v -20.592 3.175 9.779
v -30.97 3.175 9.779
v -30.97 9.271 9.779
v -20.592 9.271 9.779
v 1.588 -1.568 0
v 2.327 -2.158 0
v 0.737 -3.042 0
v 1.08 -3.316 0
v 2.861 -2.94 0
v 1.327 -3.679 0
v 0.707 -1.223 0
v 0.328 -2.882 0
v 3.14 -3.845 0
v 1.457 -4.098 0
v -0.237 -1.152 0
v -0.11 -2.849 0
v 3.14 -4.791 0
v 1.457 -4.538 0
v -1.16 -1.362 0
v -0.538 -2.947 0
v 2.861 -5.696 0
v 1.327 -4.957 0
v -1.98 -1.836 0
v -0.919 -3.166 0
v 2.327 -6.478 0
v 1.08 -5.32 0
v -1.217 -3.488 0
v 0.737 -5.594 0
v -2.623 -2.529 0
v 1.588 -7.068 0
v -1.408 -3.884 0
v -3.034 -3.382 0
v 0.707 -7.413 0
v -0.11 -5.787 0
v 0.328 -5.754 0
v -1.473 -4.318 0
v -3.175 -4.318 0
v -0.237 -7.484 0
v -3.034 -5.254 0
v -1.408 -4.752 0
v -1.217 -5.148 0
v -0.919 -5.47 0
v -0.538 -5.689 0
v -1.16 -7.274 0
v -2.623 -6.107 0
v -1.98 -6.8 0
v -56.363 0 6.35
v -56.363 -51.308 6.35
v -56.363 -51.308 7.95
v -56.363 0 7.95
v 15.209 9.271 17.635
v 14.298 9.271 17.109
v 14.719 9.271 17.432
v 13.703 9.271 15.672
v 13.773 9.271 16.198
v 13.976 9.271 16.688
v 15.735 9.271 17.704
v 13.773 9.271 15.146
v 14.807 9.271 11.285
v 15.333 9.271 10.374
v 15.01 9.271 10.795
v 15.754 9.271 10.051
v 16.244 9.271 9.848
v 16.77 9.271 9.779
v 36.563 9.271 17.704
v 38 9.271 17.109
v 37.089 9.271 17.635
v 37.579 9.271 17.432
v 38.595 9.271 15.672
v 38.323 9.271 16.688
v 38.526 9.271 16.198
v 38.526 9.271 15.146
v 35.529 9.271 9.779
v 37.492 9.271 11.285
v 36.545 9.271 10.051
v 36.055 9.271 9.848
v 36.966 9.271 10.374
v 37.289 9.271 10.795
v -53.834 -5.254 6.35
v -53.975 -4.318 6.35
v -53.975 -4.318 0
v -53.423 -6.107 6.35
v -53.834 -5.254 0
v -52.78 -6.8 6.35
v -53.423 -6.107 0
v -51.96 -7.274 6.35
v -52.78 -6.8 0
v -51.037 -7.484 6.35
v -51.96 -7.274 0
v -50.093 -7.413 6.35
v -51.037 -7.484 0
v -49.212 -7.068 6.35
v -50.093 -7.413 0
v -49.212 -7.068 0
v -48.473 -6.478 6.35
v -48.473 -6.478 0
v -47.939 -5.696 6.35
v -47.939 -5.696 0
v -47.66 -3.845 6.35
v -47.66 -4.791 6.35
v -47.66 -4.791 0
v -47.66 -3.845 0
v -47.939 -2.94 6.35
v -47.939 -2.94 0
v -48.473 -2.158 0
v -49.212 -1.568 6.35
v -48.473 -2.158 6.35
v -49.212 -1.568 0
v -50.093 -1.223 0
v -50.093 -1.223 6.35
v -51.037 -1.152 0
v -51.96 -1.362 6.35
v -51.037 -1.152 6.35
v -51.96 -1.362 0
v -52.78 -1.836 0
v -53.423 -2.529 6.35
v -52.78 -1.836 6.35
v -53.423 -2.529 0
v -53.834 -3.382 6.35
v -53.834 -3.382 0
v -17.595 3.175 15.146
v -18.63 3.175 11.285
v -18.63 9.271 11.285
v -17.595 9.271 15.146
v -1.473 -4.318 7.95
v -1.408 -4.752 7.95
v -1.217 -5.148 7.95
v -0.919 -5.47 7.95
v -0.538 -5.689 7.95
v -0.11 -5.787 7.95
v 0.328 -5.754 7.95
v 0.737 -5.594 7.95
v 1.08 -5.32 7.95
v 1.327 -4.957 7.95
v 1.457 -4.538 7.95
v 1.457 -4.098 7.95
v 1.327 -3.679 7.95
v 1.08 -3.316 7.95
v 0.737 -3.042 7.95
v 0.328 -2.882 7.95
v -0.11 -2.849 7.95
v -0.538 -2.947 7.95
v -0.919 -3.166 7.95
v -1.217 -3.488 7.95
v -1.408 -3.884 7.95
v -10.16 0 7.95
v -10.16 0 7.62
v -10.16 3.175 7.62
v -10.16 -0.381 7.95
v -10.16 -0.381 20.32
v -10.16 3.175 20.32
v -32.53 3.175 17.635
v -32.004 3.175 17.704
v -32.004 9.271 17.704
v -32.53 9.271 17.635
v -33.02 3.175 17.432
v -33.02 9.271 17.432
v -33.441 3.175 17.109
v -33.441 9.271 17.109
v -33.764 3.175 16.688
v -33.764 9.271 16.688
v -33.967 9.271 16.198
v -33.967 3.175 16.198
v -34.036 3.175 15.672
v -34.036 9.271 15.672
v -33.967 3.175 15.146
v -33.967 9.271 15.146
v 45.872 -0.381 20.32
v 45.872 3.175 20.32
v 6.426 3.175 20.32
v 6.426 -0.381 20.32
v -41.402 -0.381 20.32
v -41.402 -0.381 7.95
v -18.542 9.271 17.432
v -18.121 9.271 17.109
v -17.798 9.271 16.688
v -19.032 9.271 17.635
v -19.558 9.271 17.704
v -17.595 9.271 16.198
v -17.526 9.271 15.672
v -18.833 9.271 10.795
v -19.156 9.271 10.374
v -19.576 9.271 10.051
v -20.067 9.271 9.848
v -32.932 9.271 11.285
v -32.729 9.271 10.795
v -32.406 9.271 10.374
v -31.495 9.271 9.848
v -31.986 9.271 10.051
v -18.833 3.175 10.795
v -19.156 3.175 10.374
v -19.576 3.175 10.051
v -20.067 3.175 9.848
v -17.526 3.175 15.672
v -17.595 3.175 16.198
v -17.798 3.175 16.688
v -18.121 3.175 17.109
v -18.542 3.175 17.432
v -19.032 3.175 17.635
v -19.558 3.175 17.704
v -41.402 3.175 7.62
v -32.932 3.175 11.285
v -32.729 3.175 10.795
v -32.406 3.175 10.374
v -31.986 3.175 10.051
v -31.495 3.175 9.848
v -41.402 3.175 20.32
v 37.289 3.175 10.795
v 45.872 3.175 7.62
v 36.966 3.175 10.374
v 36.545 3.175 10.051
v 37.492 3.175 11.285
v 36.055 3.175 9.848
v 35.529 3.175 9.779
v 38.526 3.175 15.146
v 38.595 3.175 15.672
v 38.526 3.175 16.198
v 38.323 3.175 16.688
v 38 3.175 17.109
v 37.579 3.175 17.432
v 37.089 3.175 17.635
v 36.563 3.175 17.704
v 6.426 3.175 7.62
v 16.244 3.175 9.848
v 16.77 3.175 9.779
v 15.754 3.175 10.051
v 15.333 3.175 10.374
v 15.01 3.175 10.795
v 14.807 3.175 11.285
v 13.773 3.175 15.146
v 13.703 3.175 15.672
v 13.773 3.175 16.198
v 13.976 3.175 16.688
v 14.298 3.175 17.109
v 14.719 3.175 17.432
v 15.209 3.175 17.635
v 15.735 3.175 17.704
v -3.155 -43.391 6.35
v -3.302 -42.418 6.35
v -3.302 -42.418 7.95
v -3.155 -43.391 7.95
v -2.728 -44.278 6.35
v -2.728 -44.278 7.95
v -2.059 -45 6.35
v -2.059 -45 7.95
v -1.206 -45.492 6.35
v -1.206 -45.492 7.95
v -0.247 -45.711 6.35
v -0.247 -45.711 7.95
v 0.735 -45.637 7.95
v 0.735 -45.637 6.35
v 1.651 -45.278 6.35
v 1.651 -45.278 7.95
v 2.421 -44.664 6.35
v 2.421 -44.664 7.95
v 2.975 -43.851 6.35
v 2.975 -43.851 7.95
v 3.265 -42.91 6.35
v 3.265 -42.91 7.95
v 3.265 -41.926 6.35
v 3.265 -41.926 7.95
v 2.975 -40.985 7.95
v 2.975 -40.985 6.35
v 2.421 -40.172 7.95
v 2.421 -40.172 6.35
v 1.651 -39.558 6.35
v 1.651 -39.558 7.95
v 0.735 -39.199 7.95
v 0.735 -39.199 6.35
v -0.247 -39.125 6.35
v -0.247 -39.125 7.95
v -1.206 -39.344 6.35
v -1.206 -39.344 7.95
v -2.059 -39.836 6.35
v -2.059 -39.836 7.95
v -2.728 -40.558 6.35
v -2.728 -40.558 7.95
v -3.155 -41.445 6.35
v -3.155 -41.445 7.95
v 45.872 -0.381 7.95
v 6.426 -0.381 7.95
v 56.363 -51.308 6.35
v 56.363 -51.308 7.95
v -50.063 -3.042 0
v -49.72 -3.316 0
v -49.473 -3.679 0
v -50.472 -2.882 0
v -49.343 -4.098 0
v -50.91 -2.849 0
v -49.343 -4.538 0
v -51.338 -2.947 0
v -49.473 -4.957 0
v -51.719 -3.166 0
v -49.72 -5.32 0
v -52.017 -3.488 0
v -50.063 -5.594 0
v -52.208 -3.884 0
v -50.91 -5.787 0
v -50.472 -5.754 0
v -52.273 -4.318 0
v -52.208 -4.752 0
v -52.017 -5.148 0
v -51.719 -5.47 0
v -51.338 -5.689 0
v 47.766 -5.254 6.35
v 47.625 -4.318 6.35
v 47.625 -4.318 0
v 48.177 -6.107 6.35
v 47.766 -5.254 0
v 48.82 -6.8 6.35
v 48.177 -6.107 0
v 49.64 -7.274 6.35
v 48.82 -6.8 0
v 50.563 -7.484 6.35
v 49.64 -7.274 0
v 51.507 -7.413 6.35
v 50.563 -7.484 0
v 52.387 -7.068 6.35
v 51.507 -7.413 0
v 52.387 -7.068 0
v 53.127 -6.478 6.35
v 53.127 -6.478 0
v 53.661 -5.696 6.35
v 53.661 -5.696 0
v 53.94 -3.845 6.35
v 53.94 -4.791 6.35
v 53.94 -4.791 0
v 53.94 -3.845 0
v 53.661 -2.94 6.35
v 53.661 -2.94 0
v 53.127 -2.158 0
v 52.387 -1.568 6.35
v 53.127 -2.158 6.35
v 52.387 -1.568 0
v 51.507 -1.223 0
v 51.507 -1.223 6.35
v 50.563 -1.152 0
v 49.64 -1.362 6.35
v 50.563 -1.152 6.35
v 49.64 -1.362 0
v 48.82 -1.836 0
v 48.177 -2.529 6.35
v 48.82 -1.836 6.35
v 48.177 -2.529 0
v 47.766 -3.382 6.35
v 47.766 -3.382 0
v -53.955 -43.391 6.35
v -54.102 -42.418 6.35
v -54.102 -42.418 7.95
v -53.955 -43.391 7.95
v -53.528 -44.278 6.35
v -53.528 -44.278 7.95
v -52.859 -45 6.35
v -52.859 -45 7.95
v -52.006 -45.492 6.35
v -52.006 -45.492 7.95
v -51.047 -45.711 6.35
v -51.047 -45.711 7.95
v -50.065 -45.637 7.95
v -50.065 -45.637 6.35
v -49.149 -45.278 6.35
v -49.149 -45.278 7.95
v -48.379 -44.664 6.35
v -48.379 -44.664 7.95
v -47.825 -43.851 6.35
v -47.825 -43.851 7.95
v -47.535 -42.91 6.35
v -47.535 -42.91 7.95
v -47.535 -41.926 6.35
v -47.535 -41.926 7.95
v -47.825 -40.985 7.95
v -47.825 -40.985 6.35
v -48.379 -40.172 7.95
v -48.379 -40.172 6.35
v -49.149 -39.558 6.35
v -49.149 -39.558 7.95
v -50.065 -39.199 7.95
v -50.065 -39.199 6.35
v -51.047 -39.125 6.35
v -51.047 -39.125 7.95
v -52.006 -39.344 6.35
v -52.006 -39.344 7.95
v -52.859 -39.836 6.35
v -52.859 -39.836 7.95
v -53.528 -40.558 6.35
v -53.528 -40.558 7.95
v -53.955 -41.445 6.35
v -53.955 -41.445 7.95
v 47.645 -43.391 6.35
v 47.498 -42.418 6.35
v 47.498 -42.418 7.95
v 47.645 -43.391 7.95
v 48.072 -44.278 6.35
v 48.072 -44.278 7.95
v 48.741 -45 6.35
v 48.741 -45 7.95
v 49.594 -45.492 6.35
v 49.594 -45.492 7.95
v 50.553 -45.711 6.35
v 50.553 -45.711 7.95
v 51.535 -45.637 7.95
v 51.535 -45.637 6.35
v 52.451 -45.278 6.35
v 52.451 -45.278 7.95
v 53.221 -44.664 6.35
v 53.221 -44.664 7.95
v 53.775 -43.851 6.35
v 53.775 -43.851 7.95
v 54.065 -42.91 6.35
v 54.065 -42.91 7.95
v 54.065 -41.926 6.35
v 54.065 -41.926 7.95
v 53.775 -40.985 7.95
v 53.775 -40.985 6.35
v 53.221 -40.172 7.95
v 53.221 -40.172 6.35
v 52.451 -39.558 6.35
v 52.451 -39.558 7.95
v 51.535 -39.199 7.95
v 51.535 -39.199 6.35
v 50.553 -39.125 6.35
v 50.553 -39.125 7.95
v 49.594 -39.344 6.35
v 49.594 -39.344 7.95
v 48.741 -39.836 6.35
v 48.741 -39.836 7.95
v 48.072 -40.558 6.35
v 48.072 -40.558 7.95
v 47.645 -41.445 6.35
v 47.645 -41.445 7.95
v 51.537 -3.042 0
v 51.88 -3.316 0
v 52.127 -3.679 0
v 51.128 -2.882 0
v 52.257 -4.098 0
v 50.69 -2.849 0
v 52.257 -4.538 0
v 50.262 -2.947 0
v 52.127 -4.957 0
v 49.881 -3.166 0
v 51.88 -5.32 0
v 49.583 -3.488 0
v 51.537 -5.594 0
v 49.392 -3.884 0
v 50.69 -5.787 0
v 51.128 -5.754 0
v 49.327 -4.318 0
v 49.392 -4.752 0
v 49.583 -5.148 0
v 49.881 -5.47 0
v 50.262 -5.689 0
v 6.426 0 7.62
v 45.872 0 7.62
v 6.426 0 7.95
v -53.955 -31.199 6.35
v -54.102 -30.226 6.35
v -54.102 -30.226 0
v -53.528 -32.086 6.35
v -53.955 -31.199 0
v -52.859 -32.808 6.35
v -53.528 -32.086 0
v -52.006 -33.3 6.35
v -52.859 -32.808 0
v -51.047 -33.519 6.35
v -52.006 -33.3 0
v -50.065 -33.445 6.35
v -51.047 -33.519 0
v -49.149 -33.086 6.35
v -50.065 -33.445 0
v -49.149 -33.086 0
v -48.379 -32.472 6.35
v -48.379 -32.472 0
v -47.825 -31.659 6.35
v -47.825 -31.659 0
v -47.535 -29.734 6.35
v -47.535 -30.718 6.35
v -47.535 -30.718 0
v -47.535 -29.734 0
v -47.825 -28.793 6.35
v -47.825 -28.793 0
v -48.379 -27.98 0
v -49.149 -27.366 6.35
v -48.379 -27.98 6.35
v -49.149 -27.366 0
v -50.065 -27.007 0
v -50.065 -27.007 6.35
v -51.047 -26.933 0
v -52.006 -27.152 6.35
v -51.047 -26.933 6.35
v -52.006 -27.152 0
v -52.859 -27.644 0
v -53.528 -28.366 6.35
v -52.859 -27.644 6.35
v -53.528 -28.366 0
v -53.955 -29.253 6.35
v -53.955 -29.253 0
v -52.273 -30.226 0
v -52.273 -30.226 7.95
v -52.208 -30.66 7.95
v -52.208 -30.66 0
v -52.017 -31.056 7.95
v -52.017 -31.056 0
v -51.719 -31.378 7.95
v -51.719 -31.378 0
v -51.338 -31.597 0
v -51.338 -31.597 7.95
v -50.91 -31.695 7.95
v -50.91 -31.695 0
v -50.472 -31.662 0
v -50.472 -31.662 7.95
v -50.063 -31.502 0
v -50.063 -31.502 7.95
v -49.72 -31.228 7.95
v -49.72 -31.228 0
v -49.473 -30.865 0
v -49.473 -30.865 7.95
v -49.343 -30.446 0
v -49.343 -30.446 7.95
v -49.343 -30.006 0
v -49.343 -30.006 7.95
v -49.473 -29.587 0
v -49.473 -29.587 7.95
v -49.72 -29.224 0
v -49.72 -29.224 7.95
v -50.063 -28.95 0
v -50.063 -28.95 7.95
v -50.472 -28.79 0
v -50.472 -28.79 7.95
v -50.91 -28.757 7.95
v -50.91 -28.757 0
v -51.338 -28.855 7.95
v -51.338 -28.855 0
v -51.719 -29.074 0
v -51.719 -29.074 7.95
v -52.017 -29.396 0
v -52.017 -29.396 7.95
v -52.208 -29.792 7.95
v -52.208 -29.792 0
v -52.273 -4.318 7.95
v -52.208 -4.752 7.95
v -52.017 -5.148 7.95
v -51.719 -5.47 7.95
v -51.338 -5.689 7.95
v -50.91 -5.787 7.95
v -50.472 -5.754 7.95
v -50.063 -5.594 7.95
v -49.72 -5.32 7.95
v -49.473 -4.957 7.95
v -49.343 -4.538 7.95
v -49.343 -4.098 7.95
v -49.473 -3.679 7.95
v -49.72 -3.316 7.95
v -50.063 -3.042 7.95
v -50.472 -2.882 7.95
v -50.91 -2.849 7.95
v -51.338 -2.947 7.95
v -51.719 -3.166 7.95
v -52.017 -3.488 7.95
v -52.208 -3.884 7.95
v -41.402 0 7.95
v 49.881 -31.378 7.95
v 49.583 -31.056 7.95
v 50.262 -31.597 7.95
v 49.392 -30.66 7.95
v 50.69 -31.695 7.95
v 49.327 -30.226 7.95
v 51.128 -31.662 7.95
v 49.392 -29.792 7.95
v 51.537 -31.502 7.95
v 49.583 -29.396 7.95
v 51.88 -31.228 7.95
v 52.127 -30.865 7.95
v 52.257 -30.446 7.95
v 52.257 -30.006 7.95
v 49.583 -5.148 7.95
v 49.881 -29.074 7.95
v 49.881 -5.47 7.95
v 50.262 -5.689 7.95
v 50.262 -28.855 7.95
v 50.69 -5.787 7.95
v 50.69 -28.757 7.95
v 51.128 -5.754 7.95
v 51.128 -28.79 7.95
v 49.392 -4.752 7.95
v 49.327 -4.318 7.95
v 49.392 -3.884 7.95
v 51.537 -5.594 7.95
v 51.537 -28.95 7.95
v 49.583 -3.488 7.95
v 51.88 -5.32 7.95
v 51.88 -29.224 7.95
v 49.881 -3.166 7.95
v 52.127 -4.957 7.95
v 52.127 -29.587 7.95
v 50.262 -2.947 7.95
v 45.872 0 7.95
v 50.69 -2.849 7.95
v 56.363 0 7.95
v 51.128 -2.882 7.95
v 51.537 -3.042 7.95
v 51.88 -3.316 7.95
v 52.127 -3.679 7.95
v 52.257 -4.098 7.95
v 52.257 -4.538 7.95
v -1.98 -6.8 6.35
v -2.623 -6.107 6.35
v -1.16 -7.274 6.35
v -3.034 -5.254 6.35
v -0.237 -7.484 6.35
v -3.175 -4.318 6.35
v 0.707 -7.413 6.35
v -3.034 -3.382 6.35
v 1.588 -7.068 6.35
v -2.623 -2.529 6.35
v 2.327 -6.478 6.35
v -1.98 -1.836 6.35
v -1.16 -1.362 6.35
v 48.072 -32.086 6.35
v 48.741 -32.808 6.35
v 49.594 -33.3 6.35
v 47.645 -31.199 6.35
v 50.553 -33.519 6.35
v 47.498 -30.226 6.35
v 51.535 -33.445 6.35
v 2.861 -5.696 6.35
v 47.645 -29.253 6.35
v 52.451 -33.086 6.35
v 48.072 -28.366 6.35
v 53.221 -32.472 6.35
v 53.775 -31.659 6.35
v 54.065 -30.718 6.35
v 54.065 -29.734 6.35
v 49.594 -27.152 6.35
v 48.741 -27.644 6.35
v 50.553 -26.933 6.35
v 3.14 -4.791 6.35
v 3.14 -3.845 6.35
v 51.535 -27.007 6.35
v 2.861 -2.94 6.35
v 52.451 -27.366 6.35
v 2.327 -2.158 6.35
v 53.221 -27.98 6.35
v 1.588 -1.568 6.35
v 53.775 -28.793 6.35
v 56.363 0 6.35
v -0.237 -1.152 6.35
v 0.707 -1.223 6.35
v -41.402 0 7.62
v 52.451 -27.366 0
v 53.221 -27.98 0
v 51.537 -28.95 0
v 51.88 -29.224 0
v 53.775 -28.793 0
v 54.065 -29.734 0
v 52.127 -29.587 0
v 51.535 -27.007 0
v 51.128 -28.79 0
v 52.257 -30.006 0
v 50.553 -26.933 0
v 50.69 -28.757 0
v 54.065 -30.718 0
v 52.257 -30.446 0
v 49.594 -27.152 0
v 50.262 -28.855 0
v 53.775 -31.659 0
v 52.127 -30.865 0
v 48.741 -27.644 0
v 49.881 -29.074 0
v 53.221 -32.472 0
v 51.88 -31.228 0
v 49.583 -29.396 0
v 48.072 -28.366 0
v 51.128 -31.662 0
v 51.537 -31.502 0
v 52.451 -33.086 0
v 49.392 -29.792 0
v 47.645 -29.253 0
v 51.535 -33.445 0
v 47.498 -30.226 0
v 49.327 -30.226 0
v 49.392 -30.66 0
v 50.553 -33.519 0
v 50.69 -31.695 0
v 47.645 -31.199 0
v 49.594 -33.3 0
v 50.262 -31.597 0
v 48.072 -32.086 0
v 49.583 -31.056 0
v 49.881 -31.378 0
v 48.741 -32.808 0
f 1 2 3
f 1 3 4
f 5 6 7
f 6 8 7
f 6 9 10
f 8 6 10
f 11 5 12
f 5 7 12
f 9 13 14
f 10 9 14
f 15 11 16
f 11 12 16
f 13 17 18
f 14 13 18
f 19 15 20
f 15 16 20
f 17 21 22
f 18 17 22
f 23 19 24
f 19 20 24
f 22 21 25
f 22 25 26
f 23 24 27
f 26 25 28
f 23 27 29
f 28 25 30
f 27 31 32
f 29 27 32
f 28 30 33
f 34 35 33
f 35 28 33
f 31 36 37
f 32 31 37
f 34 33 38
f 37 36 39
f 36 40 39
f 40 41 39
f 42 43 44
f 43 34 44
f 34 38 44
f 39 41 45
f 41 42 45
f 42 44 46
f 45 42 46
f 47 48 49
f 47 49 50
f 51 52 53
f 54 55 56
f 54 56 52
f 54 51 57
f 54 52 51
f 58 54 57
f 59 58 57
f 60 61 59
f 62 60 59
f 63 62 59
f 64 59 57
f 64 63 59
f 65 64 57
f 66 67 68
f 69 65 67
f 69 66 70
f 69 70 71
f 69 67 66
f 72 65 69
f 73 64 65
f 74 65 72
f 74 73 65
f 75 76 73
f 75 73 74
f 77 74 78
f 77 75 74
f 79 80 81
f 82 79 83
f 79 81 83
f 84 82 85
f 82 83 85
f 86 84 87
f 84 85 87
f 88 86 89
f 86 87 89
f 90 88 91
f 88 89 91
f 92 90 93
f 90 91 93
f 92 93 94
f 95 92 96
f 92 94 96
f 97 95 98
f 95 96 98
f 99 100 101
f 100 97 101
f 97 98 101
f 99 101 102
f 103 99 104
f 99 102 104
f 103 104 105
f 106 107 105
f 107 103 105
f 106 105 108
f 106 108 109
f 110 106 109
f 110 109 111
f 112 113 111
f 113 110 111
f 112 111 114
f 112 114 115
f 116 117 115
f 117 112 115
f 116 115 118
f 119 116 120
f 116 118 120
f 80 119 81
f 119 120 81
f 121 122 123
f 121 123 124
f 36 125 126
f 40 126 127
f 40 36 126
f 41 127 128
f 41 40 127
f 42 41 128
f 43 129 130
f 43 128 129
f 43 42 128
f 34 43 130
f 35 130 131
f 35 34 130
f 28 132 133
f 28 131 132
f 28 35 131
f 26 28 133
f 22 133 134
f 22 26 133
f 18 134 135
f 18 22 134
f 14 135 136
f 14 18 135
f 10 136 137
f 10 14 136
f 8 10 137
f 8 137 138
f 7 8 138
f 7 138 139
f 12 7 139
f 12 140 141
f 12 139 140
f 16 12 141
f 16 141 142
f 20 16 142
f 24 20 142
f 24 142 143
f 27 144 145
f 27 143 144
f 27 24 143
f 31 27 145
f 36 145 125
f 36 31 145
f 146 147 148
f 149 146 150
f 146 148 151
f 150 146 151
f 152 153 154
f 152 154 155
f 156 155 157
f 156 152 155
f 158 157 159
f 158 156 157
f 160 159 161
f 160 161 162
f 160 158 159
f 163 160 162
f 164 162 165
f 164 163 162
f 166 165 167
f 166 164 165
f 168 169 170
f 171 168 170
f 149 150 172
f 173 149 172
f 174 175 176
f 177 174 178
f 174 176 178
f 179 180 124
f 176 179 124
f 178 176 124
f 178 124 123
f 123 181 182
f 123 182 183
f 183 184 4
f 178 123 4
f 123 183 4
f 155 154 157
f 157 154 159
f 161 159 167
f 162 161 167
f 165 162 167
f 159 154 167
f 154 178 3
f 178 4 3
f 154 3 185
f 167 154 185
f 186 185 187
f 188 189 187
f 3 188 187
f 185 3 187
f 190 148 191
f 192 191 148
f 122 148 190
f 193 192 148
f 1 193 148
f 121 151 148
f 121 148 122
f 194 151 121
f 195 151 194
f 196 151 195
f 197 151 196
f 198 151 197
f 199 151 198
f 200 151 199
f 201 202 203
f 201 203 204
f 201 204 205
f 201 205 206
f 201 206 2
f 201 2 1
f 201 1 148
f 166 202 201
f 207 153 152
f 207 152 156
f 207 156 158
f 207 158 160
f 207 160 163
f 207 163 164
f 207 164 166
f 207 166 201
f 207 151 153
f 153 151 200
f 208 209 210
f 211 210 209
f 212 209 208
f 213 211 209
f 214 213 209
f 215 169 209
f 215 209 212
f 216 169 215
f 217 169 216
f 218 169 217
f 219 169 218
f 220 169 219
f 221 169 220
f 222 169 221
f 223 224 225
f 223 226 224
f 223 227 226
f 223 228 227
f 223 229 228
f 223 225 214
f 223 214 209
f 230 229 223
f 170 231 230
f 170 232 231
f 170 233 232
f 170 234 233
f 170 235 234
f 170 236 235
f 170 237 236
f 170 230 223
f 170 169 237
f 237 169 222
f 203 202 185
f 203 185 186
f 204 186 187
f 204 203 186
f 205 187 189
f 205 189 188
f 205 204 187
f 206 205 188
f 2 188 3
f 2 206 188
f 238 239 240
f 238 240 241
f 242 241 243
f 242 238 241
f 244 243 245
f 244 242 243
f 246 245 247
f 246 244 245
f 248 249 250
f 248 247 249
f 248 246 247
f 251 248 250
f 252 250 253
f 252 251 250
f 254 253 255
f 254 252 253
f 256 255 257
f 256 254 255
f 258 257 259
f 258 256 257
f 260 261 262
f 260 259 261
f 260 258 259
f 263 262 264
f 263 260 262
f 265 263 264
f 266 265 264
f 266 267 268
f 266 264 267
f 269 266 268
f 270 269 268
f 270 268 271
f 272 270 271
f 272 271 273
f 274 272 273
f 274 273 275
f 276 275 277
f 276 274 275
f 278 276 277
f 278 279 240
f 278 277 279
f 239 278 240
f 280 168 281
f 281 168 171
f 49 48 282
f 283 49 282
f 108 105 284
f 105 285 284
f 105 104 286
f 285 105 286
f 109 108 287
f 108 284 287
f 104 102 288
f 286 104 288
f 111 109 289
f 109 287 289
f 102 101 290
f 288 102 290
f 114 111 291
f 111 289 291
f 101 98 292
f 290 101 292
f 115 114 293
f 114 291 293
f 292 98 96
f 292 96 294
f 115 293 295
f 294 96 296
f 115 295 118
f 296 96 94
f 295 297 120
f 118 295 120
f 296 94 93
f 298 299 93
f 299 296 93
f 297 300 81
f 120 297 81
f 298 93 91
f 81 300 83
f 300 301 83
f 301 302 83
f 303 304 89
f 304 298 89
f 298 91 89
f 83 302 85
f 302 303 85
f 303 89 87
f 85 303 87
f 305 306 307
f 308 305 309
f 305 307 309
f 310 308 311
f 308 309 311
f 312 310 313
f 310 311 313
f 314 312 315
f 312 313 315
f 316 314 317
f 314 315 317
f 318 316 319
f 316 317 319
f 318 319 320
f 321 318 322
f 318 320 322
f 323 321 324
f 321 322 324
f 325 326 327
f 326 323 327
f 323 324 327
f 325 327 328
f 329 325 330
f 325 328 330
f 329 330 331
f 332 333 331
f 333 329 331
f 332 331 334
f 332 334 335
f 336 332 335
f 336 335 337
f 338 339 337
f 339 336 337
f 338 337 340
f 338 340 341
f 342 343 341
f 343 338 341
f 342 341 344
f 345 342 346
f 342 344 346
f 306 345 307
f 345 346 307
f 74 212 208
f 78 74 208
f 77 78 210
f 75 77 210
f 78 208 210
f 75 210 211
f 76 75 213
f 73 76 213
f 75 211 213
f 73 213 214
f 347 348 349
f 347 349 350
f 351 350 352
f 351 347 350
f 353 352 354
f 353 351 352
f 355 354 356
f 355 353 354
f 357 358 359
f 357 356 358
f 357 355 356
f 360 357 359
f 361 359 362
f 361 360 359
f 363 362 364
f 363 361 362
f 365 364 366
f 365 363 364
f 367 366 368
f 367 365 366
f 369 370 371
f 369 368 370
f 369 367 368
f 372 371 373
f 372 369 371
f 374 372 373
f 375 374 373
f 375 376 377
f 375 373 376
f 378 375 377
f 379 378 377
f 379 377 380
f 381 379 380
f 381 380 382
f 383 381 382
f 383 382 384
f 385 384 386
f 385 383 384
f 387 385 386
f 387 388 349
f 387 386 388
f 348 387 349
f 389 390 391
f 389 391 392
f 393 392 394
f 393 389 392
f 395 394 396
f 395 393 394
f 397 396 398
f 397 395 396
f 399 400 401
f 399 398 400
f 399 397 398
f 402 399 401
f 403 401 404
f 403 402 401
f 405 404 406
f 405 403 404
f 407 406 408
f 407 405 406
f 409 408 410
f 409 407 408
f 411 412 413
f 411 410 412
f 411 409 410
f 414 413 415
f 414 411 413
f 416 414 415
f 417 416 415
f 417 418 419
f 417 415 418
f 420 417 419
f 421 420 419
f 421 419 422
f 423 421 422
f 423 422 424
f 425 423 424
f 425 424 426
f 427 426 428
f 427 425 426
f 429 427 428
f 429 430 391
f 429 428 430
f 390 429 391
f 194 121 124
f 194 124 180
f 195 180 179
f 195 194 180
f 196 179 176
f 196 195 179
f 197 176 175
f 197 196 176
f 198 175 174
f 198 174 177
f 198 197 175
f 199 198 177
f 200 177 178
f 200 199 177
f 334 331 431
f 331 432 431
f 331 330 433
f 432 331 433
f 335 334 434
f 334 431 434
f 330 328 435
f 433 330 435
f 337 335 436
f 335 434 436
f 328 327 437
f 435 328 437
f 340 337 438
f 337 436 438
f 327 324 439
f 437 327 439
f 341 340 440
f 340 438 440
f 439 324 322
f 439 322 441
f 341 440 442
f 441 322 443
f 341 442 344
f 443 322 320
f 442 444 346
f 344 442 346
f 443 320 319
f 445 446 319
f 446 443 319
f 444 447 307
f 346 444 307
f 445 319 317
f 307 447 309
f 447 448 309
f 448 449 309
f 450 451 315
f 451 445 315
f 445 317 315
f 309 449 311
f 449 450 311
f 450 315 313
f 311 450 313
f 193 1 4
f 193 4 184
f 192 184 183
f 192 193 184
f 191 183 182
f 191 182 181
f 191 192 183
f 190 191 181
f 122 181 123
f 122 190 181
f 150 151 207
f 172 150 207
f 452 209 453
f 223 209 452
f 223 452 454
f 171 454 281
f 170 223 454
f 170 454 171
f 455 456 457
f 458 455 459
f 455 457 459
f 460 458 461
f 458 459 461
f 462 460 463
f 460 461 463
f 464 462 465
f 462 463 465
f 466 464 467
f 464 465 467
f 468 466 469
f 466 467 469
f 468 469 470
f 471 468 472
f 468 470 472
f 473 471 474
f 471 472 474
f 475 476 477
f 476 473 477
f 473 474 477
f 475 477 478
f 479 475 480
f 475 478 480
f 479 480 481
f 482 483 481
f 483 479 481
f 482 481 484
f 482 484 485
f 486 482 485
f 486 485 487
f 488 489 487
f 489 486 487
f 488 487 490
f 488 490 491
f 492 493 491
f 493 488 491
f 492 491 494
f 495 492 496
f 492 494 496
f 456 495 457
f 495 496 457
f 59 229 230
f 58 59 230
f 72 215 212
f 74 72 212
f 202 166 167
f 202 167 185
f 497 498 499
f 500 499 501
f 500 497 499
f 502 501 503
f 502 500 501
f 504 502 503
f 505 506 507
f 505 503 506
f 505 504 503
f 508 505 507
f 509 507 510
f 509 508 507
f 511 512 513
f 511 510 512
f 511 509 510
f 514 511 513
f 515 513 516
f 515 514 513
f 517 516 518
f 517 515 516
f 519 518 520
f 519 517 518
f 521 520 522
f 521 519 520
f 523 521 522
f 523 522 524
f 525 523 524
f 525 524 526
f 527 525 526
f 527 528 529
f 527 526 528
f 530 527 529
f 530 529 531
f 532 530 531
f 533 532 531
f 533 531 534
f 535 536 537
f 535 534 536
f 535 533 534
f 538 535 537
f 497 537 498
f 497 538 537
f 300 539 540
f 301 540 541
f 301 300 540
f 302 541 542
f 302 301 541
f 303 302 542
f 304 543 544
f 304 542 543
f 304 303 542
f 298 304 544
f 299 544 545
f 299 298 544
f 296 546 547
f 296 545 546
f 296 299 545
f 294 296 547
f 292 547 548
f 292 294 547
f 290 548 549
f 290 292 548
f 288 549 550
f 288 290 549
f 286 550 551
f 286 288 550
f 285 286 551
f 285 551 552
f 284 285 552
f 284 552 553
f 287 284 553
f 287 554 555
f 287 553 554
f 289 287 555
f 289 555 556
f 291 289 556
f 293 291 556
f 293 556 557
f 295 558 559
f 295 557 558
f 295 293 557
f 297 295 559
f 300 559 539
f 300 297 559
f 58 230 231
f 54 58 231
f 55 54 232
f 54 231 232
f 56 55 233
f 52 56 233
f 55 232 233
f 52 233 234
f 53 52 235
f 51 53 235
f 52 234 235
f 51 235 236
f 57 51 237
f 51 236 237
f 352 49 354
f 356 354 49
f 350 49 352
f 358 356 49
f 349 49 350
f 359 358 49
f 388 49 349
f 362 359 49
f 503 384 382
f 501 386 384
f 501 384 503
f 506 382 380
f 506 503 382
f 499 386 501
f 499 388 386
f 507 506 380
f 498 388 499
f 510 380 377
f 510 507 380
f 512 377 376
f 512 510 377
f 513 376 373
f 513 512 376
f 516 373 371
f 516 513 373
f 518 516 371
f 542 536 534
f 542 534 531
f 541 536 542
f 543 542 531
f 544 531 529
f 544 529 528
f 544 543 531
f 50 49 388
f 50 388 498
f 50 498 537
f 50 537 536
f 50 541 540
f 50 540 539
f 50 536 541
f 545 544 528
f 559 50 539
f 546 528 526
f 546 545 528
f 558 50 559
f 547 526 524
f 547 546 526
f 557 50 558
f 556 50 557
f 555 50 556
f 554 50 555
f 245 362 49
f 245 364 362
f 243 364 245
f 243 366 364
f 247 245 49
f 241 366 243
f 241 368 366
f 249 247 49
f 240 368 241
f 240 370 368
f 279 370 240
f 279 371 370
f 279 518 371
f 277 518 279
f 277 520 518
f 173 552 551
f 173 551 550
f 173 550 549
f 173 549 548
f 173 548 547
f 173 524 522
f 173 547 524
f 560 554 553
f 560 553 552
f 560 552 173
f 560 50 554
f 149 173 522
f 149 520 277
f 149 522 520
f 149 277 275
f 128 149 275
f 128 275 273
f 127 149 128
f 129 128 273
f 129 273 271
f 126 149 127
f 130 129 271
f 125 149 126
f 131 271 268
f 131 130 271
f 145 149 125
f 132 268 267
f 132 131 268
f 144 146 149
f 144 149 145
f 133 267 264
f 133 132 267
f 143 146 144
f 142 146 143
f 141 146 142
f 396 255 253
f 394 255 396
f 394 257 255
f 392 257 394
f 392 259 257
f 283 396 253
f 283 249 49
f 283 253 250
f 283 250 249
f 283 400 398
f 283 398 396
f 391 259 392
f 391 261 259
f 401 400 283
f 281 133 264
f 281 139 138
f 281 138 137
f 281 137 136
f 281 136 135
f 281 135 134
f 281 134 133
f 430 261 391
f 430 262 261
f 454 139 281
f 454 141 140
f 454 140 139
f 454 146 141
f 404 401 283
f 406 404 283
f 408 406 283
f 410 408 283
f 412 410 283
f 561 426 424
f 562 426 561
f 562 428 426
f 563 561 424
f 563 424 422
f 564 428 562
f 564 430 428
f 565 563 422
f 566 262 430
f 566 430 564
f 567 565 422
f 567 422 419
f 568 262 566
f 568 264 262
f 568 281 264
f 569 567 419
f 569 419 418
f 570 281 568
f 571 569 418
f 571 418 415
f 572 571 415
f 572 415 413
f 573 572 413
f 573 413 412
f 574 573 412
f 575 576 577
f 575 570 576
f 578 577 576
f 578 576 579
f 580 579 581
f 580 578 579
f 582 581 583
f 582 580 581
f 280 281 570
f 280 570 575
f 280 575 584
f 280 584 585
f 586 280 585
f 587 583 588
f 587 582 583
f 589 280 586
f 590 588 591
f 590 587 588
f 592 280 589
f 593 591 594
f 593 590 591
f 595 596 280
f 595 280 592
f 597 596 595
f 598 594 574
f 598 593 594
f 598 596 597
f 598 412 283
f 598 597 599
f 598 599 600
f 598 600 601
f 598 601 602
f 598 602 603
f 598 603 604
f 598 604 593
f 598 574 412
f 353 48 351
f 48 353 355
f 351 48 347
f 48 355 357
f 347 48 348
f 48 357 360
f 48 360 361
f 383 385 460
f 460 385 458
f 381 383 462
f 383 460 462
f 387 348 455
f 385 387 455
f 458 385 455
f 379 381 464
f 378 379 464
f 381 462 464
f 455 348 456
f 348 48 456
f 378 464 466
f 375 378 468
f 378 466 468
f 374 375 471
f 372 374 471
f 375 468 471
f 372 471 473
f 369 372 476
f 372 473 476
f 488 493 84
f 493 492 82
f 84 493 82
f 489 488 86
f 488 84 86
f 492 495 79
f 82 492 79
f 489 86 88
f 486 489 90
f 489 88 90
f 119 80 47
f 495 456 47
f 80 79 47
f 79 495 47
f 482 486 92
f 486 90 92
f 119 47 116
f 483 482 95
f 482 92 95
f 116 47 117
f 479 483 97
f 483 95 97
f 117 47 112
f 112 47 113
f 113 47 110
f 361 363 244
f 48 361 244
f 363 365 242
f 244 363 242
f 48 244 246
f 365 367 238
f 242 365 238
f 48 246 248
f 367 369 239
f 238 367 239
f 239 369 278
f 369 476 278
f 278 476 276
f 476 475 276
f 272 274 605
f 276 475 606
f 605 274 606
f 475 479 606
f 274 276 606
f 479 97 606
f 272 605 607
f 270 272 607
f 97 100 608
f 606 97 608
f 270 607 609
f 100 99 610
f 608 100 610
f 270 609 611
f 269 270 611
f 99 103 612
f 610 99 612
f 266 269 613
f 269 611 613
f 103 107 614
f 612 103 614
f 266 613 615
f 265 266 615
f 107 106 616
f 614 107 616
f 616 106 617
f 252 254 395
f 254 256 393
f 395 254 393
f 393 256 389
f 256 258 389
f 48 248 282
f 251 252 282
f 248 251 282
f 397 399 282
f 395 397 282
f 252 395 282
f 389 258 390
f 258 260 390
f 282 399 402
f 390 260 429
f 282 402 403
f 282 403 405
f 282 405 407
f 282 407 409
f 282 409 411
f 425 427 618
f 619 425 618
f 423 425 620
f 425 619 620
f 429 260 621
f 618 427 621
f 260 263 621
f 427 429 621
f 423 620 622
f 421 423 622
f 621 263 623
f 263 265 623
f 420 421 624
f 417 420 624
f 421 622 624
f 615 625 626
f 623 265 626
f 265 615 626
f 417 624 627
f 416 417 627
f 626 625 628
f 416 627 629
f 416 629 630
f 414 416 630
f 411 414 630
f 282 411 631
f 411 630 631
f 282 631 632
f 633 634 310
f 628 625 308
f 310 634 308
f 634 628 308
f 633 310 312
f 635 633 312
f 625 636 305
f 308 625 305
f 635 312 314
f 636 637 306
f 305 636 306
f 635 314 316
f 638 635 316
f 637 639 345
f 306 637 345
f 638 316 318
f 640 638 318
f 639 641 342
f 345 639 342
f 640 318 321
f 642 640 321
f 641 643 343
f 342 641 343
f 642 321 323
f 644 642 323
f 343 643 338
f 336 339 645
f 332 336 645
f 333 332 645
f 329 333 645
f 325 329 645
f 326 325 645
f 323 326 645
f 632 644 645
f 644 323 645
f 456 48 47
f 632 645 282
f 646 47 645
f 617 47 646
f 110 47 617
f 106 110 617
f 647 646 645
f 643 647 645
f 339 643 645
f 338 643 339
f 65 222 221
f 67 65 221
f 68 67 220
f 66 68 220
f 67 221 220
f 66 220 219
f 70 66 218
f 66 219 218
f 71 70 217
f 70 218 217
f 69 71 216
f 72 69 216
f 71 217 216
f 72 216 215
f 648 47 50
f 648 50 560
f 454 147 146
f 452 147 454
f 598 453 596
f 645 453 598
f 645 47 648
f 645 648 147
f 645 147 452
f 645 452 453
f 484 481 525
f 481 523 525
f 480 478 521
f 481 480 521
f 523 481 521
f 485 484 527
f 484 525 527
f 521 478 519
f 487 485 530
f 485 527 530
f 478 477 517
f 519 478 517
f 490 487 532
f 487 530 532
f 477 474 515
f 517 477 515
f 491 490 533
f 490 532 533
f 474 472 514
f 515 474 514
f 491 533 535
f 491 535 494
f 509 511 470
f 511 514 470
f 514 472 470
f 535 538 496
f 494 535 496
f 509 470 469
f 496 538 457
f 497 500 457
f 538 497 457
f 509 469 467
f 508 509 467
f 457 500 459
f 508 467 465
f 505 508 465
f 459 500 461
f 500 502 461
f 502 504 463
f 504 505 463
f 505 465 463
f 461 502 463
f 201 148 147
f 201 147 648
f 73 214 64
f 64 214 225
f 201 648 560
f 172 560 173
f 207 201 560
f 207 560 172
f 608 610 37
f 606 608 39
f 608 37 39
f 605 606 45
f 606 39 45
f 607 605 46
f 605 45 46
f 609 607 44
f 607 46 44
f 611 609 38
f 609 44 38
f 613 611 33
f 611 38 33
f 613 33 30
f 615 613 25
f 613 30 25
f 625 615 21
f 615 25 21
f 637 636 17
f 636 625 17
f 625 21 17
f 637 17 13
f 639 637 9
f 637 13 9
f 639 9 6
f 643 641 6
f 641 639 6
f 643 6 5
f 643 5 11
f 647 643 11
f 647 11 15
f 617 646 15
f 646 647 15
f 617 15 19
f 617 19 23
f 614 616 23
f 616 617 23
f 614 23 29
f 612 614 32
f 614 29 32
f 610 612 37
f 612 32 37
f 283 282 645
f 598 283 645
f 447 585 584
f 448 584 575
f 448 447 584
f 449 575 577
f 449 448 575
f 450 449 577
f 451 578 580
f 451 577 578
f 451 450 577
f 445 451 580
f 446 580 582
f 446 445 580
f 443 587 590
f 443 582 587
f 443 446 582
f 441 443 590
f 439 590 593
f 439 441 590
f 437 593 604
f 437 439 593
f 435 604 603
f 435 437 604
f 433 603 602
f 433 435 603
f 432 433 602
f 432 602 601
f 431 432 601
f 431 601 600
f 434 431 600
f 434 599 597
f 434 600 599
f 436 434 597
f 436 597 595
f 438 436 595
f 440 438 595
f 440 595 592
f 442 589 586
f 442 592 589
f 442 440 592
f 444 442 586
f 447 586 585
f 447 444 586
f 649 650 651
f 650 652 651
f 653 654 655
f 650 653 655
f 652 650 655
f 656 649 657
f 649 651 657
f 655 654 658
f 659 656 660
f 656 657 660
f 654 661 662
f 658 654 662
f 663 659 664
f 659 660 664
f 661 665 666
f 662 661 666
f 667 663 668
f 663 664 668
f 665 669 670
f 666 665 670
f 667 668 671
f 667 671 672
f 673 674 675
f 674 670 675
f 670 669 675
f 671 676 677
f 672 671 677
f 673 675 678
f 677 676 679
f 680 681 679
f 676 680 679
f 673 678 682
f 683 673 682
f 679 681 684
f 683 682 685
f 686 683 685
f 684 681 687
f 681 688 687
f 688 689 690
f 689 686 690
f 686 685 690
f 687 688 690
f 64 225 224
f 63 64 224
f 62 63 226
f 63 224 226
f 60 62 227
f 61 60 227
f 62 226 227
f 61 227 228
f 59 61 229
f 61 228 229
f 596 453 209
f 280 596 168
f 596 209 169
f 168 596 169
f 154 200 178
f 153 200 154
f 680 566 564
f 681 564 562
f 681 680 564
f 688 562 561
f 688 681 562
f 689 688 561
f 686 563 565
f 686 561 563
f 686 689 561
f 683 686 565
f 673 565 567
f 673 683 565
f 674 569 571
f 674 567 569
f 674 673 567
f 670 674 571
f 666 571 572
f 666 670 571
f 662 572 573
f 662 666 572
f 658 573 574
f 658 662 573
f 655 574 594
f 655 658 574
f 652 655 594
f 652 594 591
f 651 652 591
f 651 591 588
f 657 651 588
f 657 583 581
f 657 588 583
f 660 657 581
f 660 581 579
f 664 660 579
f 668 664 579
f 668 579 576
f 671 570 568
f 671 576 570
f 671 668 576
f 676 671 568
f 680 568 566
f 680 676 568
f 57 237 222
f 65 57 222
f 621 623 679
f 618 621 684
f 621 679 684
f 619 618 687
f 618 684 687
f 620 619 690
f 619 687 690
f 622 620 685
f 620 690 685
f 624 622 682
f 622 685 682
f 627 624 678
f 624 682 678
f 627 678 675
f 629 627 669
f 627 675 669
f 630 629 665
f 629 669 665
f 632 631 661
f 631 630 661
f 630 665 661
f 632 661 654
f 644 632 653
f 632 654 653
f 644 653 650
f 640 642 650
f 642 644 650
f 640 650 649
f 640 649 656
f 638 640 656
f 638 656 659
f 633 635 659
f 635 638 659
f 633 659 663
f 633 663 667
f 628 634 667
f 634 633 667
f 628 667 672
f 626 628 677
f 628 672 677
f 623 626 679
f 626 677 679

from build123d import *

# Parameters (mm, degrees)
SKETCH1_W          = 112.7252
SKETCH1_H          = 51.308
EXTRUDE1_DEPTH     = 1.6002
EXTRUDE2_REACH     = 78.632
SKETCH2_R          = 3.175
SKETCH2_R_2        = 3.302
SKETCH3_R          = 3.302
SKETCH3_R_2        = 1.4732
CUT_EXTRUDE1_DEPTH = 12.7
SKETCH4_W          = 31.242
SKETCH4_H          = 12.7
SKETCH4_W_2        = 39.4462
EXTRUDE3_DEPTH     = 3.556
EXTRUDE4_DEPTH     = 6.096


with BuildPart() as part:
    # Sketch1 → Extrude1 (new body)
    with BuildSketch(Plane.XY.offset(6.35)):
        with Locations((0, -25.654)):
            Rectangle(SKETCH1_W, SKETCH1_H)
    extrude(amount=EXTRUDE1_DEPTH)

    # Sketch2 → Extrude2 (add, up to next)
    with BuildSketch(Plane.XY, mode=Mode.PRIVATE) as extrude2_sk1:
        with Locations(Location((-50.8, -4.318, 0), (0, 0, 180))):
            Circle(SKETCH2_R)
    extrude2_tool1 = extrude(extrude2_sk1.sketch, amount=EXTRUDE2_REACH, mode=Mode.PRIVATE) - part.part
    # Sketch2 → Extrude2 (add, up to next)
    with BuildSketch(Plane.XY, mode=Mode.PRIVATE) as extrude2_sk2:
        with Locations(Location((50.8, -4.318, 0), (0, 0, 180))):
            Circle(SKETCH2_R)
    extrude2_tool2 = extrude(extrude2_sk2.sketch, amount=EXTRUDE2_REACH, mode=Mode.PRIVATE) - part.part
    # Sketch2 → Extrude2 (add, up to next)
    with BuildSketch(Plane.XY, mode=Mode.PRIVATE) as extrude2_sk3:
        with Locations(Location((-50.8, -30.226, 0), (0, 0, 180))):
            Circle(SKETCH2_R_2)
    extrude2_tool3 = extrude(extrude2_sk3.sketch, amount=EXTRUDE2_REACH, mode=Mode.PRIVATE) - part.part
    # Sketch2 → Extrude2 (add, up to next)
    with BuildSketch(Plane.XY, mode=Mode.PRIVATE) as extrude2_sk4:
        with Locations(Location((50.8, -30.226, 0), (0, 0, 180))):
            Circle(SKETCH2_R_2)
    extrude2_tool4 = extrude(extrude2_sk4.sketch, amount=EXTRUDE2_REACH, mode=Mode.PRIVATE) - part.part
    # Sketch2 → Extrude2 (add, up to next)
    with BuildSketch(Plane.XY, mode=Mode.PRIVATE) as extrude2_sk5:
        with Locations(Location((0, -4.318, 0), (0, 0, 180))):
            Circle(SKETCH2_R)
    extrude2_tool5 = extrude(extrude2_sk5.sketch, amount=EXTRUDE2_REACH, mode=Mode.PRIVATE) - part.part
    add(extrude2_tool1.solids().sort_by_distance((-50.8, -4.318, 0))[0])
    add(extrude2_tool2.solids().sort_by_distance((50.8, -4.318, 0))[0])
    add(extrude2_tool3.solids().sort_by_distance((-50.8, -30.226, 0))[0])
    add(extrude2_tool4.solids().sort_by_distance((50.8, -30.226, 0))[0])
    add(extrude2_tool5.solids().sort_by_distance((0, -4.318, 0))[0])

    # Sketch3 → Cut-Extrude1 (cut)
    with BuildSketch(Plane.XY):
        with Locations(Location((50.8, -42.418, 0), (0, 0, 180))):
            Circle(SKETCH3_R)
        with Locations(Location((0, -42.418, 0), (0, 0, 180))):
            Circle(SKETCH3_R)
        with Locations(Location((-50.8, -42.418, 0), (0, 0, 180))):
            Circle(SKETCH3_R)
        with Locations(Location((50.8, -30.226, 0), (0, 0, 180))):
            Circle(SKETCH3_R_2)
        with Locations(Location((50.8, -4.318, 0), (0, 0, 180))):
            Circle(SKETCH3_R_2)
        with Locations(Location((0, -4.318, 0), (0, 0, 180))):
            Circle(SKETCH3_R_2)
        with Locations(Location((-50.8, -4.318, 0), (0, 0, 180))):
            Circle(SKETCH3_R_2)
        with Locations(Location((-50.8, -30.226, 0), (0, 0, 180))):
            Circle(SKETCH3_R_2)
    extrude(amount=CUT_EXTRUDE1_DEPTH, mode=Mode.SUBTRACT)

    # Sketch4 → Extrude3 (add)
    with BuildSketch(Plane(origin=(0, 3.175, 0), x_dir=(-1, 0, 0), z_dir=(0, 1, 0))):
        with Locations((25.781, 13.97)):
            Rectangle(SKETCH4_W, SKETCH4_H)
        with Locations((-26.1493, 13.97)):
            Rectangle(SKETCH4_W_2, SKETCH4_H)
    extrude(amount=-EXTRUDE3_DEPTH)

    # Sketch5 → Extrude4 (add)
    with BuildSketch(Plane(origin=(0, 3.175, 0), x_dir=(1, 0, 0), z_dir=(0, 1, 0))):
        with BuildLine():
            Line((15.7353, -17.7038), (36.5633, -17.7038))
            ThreePointArc((36.5633, -17.7038), (38.175393987, -16.908803224), (38.526061279, -15.1458797))
            Line((38.526061279, -15.1458797), (37.491563037, -11.2850797))
            ThreePointArc((37.491563037, -11.2850797), (36.765804982, -10.198906013), (35.528801758, -9.779))
            Line((35.528801758, -9.779), (16.769798242, -9.779))
            ThreePointArc((16.769798242, -9.779), (15.532795018, -10.198906013), (14.807036963, -11.2850797))
            Line((14.807036963, -11.2850797), (13.772538721, -15.1458797))
            ThreePointArc((13.772538721, -15.1458797), (14.123206013, -16.908803224), (15.7353, -17.7038))
        make_face()
        with BuildLine():
            Line((-30.969501758, -9.779), (-20.592498242, -9.779))
            ThreePointArc((-20.592498242, -9.779), (-19.355495018, -10.198906013), (-18.629736963, -11.2850797))
            Line((-18.629736963, -11.2850797), (-17.595238721, -15.1458797))
            ThreePointArc((-17.595238721, -15.1458797), (-17.945906013, -16.908803224), (-19.558, -17.7038))
            Line((-19.558, -17.7038), (-32.004, -17.7038))
            ThreePointArc((-32.004, -17.7038), (-33.616093987, -16.908803224), (-33.966761279, -15.1458797))
            Line((-33.966761279, -15.1458797), (-32.932263037, -11.2850797))
            ThreePointArc((-32.932263037, -11.2850797), (-32.206504982, -10.198906013), (-30.969501758, -9.779))
        make_face()
    extrude(amount=EXTRUDE4_DEPTH)


solid = part.part
